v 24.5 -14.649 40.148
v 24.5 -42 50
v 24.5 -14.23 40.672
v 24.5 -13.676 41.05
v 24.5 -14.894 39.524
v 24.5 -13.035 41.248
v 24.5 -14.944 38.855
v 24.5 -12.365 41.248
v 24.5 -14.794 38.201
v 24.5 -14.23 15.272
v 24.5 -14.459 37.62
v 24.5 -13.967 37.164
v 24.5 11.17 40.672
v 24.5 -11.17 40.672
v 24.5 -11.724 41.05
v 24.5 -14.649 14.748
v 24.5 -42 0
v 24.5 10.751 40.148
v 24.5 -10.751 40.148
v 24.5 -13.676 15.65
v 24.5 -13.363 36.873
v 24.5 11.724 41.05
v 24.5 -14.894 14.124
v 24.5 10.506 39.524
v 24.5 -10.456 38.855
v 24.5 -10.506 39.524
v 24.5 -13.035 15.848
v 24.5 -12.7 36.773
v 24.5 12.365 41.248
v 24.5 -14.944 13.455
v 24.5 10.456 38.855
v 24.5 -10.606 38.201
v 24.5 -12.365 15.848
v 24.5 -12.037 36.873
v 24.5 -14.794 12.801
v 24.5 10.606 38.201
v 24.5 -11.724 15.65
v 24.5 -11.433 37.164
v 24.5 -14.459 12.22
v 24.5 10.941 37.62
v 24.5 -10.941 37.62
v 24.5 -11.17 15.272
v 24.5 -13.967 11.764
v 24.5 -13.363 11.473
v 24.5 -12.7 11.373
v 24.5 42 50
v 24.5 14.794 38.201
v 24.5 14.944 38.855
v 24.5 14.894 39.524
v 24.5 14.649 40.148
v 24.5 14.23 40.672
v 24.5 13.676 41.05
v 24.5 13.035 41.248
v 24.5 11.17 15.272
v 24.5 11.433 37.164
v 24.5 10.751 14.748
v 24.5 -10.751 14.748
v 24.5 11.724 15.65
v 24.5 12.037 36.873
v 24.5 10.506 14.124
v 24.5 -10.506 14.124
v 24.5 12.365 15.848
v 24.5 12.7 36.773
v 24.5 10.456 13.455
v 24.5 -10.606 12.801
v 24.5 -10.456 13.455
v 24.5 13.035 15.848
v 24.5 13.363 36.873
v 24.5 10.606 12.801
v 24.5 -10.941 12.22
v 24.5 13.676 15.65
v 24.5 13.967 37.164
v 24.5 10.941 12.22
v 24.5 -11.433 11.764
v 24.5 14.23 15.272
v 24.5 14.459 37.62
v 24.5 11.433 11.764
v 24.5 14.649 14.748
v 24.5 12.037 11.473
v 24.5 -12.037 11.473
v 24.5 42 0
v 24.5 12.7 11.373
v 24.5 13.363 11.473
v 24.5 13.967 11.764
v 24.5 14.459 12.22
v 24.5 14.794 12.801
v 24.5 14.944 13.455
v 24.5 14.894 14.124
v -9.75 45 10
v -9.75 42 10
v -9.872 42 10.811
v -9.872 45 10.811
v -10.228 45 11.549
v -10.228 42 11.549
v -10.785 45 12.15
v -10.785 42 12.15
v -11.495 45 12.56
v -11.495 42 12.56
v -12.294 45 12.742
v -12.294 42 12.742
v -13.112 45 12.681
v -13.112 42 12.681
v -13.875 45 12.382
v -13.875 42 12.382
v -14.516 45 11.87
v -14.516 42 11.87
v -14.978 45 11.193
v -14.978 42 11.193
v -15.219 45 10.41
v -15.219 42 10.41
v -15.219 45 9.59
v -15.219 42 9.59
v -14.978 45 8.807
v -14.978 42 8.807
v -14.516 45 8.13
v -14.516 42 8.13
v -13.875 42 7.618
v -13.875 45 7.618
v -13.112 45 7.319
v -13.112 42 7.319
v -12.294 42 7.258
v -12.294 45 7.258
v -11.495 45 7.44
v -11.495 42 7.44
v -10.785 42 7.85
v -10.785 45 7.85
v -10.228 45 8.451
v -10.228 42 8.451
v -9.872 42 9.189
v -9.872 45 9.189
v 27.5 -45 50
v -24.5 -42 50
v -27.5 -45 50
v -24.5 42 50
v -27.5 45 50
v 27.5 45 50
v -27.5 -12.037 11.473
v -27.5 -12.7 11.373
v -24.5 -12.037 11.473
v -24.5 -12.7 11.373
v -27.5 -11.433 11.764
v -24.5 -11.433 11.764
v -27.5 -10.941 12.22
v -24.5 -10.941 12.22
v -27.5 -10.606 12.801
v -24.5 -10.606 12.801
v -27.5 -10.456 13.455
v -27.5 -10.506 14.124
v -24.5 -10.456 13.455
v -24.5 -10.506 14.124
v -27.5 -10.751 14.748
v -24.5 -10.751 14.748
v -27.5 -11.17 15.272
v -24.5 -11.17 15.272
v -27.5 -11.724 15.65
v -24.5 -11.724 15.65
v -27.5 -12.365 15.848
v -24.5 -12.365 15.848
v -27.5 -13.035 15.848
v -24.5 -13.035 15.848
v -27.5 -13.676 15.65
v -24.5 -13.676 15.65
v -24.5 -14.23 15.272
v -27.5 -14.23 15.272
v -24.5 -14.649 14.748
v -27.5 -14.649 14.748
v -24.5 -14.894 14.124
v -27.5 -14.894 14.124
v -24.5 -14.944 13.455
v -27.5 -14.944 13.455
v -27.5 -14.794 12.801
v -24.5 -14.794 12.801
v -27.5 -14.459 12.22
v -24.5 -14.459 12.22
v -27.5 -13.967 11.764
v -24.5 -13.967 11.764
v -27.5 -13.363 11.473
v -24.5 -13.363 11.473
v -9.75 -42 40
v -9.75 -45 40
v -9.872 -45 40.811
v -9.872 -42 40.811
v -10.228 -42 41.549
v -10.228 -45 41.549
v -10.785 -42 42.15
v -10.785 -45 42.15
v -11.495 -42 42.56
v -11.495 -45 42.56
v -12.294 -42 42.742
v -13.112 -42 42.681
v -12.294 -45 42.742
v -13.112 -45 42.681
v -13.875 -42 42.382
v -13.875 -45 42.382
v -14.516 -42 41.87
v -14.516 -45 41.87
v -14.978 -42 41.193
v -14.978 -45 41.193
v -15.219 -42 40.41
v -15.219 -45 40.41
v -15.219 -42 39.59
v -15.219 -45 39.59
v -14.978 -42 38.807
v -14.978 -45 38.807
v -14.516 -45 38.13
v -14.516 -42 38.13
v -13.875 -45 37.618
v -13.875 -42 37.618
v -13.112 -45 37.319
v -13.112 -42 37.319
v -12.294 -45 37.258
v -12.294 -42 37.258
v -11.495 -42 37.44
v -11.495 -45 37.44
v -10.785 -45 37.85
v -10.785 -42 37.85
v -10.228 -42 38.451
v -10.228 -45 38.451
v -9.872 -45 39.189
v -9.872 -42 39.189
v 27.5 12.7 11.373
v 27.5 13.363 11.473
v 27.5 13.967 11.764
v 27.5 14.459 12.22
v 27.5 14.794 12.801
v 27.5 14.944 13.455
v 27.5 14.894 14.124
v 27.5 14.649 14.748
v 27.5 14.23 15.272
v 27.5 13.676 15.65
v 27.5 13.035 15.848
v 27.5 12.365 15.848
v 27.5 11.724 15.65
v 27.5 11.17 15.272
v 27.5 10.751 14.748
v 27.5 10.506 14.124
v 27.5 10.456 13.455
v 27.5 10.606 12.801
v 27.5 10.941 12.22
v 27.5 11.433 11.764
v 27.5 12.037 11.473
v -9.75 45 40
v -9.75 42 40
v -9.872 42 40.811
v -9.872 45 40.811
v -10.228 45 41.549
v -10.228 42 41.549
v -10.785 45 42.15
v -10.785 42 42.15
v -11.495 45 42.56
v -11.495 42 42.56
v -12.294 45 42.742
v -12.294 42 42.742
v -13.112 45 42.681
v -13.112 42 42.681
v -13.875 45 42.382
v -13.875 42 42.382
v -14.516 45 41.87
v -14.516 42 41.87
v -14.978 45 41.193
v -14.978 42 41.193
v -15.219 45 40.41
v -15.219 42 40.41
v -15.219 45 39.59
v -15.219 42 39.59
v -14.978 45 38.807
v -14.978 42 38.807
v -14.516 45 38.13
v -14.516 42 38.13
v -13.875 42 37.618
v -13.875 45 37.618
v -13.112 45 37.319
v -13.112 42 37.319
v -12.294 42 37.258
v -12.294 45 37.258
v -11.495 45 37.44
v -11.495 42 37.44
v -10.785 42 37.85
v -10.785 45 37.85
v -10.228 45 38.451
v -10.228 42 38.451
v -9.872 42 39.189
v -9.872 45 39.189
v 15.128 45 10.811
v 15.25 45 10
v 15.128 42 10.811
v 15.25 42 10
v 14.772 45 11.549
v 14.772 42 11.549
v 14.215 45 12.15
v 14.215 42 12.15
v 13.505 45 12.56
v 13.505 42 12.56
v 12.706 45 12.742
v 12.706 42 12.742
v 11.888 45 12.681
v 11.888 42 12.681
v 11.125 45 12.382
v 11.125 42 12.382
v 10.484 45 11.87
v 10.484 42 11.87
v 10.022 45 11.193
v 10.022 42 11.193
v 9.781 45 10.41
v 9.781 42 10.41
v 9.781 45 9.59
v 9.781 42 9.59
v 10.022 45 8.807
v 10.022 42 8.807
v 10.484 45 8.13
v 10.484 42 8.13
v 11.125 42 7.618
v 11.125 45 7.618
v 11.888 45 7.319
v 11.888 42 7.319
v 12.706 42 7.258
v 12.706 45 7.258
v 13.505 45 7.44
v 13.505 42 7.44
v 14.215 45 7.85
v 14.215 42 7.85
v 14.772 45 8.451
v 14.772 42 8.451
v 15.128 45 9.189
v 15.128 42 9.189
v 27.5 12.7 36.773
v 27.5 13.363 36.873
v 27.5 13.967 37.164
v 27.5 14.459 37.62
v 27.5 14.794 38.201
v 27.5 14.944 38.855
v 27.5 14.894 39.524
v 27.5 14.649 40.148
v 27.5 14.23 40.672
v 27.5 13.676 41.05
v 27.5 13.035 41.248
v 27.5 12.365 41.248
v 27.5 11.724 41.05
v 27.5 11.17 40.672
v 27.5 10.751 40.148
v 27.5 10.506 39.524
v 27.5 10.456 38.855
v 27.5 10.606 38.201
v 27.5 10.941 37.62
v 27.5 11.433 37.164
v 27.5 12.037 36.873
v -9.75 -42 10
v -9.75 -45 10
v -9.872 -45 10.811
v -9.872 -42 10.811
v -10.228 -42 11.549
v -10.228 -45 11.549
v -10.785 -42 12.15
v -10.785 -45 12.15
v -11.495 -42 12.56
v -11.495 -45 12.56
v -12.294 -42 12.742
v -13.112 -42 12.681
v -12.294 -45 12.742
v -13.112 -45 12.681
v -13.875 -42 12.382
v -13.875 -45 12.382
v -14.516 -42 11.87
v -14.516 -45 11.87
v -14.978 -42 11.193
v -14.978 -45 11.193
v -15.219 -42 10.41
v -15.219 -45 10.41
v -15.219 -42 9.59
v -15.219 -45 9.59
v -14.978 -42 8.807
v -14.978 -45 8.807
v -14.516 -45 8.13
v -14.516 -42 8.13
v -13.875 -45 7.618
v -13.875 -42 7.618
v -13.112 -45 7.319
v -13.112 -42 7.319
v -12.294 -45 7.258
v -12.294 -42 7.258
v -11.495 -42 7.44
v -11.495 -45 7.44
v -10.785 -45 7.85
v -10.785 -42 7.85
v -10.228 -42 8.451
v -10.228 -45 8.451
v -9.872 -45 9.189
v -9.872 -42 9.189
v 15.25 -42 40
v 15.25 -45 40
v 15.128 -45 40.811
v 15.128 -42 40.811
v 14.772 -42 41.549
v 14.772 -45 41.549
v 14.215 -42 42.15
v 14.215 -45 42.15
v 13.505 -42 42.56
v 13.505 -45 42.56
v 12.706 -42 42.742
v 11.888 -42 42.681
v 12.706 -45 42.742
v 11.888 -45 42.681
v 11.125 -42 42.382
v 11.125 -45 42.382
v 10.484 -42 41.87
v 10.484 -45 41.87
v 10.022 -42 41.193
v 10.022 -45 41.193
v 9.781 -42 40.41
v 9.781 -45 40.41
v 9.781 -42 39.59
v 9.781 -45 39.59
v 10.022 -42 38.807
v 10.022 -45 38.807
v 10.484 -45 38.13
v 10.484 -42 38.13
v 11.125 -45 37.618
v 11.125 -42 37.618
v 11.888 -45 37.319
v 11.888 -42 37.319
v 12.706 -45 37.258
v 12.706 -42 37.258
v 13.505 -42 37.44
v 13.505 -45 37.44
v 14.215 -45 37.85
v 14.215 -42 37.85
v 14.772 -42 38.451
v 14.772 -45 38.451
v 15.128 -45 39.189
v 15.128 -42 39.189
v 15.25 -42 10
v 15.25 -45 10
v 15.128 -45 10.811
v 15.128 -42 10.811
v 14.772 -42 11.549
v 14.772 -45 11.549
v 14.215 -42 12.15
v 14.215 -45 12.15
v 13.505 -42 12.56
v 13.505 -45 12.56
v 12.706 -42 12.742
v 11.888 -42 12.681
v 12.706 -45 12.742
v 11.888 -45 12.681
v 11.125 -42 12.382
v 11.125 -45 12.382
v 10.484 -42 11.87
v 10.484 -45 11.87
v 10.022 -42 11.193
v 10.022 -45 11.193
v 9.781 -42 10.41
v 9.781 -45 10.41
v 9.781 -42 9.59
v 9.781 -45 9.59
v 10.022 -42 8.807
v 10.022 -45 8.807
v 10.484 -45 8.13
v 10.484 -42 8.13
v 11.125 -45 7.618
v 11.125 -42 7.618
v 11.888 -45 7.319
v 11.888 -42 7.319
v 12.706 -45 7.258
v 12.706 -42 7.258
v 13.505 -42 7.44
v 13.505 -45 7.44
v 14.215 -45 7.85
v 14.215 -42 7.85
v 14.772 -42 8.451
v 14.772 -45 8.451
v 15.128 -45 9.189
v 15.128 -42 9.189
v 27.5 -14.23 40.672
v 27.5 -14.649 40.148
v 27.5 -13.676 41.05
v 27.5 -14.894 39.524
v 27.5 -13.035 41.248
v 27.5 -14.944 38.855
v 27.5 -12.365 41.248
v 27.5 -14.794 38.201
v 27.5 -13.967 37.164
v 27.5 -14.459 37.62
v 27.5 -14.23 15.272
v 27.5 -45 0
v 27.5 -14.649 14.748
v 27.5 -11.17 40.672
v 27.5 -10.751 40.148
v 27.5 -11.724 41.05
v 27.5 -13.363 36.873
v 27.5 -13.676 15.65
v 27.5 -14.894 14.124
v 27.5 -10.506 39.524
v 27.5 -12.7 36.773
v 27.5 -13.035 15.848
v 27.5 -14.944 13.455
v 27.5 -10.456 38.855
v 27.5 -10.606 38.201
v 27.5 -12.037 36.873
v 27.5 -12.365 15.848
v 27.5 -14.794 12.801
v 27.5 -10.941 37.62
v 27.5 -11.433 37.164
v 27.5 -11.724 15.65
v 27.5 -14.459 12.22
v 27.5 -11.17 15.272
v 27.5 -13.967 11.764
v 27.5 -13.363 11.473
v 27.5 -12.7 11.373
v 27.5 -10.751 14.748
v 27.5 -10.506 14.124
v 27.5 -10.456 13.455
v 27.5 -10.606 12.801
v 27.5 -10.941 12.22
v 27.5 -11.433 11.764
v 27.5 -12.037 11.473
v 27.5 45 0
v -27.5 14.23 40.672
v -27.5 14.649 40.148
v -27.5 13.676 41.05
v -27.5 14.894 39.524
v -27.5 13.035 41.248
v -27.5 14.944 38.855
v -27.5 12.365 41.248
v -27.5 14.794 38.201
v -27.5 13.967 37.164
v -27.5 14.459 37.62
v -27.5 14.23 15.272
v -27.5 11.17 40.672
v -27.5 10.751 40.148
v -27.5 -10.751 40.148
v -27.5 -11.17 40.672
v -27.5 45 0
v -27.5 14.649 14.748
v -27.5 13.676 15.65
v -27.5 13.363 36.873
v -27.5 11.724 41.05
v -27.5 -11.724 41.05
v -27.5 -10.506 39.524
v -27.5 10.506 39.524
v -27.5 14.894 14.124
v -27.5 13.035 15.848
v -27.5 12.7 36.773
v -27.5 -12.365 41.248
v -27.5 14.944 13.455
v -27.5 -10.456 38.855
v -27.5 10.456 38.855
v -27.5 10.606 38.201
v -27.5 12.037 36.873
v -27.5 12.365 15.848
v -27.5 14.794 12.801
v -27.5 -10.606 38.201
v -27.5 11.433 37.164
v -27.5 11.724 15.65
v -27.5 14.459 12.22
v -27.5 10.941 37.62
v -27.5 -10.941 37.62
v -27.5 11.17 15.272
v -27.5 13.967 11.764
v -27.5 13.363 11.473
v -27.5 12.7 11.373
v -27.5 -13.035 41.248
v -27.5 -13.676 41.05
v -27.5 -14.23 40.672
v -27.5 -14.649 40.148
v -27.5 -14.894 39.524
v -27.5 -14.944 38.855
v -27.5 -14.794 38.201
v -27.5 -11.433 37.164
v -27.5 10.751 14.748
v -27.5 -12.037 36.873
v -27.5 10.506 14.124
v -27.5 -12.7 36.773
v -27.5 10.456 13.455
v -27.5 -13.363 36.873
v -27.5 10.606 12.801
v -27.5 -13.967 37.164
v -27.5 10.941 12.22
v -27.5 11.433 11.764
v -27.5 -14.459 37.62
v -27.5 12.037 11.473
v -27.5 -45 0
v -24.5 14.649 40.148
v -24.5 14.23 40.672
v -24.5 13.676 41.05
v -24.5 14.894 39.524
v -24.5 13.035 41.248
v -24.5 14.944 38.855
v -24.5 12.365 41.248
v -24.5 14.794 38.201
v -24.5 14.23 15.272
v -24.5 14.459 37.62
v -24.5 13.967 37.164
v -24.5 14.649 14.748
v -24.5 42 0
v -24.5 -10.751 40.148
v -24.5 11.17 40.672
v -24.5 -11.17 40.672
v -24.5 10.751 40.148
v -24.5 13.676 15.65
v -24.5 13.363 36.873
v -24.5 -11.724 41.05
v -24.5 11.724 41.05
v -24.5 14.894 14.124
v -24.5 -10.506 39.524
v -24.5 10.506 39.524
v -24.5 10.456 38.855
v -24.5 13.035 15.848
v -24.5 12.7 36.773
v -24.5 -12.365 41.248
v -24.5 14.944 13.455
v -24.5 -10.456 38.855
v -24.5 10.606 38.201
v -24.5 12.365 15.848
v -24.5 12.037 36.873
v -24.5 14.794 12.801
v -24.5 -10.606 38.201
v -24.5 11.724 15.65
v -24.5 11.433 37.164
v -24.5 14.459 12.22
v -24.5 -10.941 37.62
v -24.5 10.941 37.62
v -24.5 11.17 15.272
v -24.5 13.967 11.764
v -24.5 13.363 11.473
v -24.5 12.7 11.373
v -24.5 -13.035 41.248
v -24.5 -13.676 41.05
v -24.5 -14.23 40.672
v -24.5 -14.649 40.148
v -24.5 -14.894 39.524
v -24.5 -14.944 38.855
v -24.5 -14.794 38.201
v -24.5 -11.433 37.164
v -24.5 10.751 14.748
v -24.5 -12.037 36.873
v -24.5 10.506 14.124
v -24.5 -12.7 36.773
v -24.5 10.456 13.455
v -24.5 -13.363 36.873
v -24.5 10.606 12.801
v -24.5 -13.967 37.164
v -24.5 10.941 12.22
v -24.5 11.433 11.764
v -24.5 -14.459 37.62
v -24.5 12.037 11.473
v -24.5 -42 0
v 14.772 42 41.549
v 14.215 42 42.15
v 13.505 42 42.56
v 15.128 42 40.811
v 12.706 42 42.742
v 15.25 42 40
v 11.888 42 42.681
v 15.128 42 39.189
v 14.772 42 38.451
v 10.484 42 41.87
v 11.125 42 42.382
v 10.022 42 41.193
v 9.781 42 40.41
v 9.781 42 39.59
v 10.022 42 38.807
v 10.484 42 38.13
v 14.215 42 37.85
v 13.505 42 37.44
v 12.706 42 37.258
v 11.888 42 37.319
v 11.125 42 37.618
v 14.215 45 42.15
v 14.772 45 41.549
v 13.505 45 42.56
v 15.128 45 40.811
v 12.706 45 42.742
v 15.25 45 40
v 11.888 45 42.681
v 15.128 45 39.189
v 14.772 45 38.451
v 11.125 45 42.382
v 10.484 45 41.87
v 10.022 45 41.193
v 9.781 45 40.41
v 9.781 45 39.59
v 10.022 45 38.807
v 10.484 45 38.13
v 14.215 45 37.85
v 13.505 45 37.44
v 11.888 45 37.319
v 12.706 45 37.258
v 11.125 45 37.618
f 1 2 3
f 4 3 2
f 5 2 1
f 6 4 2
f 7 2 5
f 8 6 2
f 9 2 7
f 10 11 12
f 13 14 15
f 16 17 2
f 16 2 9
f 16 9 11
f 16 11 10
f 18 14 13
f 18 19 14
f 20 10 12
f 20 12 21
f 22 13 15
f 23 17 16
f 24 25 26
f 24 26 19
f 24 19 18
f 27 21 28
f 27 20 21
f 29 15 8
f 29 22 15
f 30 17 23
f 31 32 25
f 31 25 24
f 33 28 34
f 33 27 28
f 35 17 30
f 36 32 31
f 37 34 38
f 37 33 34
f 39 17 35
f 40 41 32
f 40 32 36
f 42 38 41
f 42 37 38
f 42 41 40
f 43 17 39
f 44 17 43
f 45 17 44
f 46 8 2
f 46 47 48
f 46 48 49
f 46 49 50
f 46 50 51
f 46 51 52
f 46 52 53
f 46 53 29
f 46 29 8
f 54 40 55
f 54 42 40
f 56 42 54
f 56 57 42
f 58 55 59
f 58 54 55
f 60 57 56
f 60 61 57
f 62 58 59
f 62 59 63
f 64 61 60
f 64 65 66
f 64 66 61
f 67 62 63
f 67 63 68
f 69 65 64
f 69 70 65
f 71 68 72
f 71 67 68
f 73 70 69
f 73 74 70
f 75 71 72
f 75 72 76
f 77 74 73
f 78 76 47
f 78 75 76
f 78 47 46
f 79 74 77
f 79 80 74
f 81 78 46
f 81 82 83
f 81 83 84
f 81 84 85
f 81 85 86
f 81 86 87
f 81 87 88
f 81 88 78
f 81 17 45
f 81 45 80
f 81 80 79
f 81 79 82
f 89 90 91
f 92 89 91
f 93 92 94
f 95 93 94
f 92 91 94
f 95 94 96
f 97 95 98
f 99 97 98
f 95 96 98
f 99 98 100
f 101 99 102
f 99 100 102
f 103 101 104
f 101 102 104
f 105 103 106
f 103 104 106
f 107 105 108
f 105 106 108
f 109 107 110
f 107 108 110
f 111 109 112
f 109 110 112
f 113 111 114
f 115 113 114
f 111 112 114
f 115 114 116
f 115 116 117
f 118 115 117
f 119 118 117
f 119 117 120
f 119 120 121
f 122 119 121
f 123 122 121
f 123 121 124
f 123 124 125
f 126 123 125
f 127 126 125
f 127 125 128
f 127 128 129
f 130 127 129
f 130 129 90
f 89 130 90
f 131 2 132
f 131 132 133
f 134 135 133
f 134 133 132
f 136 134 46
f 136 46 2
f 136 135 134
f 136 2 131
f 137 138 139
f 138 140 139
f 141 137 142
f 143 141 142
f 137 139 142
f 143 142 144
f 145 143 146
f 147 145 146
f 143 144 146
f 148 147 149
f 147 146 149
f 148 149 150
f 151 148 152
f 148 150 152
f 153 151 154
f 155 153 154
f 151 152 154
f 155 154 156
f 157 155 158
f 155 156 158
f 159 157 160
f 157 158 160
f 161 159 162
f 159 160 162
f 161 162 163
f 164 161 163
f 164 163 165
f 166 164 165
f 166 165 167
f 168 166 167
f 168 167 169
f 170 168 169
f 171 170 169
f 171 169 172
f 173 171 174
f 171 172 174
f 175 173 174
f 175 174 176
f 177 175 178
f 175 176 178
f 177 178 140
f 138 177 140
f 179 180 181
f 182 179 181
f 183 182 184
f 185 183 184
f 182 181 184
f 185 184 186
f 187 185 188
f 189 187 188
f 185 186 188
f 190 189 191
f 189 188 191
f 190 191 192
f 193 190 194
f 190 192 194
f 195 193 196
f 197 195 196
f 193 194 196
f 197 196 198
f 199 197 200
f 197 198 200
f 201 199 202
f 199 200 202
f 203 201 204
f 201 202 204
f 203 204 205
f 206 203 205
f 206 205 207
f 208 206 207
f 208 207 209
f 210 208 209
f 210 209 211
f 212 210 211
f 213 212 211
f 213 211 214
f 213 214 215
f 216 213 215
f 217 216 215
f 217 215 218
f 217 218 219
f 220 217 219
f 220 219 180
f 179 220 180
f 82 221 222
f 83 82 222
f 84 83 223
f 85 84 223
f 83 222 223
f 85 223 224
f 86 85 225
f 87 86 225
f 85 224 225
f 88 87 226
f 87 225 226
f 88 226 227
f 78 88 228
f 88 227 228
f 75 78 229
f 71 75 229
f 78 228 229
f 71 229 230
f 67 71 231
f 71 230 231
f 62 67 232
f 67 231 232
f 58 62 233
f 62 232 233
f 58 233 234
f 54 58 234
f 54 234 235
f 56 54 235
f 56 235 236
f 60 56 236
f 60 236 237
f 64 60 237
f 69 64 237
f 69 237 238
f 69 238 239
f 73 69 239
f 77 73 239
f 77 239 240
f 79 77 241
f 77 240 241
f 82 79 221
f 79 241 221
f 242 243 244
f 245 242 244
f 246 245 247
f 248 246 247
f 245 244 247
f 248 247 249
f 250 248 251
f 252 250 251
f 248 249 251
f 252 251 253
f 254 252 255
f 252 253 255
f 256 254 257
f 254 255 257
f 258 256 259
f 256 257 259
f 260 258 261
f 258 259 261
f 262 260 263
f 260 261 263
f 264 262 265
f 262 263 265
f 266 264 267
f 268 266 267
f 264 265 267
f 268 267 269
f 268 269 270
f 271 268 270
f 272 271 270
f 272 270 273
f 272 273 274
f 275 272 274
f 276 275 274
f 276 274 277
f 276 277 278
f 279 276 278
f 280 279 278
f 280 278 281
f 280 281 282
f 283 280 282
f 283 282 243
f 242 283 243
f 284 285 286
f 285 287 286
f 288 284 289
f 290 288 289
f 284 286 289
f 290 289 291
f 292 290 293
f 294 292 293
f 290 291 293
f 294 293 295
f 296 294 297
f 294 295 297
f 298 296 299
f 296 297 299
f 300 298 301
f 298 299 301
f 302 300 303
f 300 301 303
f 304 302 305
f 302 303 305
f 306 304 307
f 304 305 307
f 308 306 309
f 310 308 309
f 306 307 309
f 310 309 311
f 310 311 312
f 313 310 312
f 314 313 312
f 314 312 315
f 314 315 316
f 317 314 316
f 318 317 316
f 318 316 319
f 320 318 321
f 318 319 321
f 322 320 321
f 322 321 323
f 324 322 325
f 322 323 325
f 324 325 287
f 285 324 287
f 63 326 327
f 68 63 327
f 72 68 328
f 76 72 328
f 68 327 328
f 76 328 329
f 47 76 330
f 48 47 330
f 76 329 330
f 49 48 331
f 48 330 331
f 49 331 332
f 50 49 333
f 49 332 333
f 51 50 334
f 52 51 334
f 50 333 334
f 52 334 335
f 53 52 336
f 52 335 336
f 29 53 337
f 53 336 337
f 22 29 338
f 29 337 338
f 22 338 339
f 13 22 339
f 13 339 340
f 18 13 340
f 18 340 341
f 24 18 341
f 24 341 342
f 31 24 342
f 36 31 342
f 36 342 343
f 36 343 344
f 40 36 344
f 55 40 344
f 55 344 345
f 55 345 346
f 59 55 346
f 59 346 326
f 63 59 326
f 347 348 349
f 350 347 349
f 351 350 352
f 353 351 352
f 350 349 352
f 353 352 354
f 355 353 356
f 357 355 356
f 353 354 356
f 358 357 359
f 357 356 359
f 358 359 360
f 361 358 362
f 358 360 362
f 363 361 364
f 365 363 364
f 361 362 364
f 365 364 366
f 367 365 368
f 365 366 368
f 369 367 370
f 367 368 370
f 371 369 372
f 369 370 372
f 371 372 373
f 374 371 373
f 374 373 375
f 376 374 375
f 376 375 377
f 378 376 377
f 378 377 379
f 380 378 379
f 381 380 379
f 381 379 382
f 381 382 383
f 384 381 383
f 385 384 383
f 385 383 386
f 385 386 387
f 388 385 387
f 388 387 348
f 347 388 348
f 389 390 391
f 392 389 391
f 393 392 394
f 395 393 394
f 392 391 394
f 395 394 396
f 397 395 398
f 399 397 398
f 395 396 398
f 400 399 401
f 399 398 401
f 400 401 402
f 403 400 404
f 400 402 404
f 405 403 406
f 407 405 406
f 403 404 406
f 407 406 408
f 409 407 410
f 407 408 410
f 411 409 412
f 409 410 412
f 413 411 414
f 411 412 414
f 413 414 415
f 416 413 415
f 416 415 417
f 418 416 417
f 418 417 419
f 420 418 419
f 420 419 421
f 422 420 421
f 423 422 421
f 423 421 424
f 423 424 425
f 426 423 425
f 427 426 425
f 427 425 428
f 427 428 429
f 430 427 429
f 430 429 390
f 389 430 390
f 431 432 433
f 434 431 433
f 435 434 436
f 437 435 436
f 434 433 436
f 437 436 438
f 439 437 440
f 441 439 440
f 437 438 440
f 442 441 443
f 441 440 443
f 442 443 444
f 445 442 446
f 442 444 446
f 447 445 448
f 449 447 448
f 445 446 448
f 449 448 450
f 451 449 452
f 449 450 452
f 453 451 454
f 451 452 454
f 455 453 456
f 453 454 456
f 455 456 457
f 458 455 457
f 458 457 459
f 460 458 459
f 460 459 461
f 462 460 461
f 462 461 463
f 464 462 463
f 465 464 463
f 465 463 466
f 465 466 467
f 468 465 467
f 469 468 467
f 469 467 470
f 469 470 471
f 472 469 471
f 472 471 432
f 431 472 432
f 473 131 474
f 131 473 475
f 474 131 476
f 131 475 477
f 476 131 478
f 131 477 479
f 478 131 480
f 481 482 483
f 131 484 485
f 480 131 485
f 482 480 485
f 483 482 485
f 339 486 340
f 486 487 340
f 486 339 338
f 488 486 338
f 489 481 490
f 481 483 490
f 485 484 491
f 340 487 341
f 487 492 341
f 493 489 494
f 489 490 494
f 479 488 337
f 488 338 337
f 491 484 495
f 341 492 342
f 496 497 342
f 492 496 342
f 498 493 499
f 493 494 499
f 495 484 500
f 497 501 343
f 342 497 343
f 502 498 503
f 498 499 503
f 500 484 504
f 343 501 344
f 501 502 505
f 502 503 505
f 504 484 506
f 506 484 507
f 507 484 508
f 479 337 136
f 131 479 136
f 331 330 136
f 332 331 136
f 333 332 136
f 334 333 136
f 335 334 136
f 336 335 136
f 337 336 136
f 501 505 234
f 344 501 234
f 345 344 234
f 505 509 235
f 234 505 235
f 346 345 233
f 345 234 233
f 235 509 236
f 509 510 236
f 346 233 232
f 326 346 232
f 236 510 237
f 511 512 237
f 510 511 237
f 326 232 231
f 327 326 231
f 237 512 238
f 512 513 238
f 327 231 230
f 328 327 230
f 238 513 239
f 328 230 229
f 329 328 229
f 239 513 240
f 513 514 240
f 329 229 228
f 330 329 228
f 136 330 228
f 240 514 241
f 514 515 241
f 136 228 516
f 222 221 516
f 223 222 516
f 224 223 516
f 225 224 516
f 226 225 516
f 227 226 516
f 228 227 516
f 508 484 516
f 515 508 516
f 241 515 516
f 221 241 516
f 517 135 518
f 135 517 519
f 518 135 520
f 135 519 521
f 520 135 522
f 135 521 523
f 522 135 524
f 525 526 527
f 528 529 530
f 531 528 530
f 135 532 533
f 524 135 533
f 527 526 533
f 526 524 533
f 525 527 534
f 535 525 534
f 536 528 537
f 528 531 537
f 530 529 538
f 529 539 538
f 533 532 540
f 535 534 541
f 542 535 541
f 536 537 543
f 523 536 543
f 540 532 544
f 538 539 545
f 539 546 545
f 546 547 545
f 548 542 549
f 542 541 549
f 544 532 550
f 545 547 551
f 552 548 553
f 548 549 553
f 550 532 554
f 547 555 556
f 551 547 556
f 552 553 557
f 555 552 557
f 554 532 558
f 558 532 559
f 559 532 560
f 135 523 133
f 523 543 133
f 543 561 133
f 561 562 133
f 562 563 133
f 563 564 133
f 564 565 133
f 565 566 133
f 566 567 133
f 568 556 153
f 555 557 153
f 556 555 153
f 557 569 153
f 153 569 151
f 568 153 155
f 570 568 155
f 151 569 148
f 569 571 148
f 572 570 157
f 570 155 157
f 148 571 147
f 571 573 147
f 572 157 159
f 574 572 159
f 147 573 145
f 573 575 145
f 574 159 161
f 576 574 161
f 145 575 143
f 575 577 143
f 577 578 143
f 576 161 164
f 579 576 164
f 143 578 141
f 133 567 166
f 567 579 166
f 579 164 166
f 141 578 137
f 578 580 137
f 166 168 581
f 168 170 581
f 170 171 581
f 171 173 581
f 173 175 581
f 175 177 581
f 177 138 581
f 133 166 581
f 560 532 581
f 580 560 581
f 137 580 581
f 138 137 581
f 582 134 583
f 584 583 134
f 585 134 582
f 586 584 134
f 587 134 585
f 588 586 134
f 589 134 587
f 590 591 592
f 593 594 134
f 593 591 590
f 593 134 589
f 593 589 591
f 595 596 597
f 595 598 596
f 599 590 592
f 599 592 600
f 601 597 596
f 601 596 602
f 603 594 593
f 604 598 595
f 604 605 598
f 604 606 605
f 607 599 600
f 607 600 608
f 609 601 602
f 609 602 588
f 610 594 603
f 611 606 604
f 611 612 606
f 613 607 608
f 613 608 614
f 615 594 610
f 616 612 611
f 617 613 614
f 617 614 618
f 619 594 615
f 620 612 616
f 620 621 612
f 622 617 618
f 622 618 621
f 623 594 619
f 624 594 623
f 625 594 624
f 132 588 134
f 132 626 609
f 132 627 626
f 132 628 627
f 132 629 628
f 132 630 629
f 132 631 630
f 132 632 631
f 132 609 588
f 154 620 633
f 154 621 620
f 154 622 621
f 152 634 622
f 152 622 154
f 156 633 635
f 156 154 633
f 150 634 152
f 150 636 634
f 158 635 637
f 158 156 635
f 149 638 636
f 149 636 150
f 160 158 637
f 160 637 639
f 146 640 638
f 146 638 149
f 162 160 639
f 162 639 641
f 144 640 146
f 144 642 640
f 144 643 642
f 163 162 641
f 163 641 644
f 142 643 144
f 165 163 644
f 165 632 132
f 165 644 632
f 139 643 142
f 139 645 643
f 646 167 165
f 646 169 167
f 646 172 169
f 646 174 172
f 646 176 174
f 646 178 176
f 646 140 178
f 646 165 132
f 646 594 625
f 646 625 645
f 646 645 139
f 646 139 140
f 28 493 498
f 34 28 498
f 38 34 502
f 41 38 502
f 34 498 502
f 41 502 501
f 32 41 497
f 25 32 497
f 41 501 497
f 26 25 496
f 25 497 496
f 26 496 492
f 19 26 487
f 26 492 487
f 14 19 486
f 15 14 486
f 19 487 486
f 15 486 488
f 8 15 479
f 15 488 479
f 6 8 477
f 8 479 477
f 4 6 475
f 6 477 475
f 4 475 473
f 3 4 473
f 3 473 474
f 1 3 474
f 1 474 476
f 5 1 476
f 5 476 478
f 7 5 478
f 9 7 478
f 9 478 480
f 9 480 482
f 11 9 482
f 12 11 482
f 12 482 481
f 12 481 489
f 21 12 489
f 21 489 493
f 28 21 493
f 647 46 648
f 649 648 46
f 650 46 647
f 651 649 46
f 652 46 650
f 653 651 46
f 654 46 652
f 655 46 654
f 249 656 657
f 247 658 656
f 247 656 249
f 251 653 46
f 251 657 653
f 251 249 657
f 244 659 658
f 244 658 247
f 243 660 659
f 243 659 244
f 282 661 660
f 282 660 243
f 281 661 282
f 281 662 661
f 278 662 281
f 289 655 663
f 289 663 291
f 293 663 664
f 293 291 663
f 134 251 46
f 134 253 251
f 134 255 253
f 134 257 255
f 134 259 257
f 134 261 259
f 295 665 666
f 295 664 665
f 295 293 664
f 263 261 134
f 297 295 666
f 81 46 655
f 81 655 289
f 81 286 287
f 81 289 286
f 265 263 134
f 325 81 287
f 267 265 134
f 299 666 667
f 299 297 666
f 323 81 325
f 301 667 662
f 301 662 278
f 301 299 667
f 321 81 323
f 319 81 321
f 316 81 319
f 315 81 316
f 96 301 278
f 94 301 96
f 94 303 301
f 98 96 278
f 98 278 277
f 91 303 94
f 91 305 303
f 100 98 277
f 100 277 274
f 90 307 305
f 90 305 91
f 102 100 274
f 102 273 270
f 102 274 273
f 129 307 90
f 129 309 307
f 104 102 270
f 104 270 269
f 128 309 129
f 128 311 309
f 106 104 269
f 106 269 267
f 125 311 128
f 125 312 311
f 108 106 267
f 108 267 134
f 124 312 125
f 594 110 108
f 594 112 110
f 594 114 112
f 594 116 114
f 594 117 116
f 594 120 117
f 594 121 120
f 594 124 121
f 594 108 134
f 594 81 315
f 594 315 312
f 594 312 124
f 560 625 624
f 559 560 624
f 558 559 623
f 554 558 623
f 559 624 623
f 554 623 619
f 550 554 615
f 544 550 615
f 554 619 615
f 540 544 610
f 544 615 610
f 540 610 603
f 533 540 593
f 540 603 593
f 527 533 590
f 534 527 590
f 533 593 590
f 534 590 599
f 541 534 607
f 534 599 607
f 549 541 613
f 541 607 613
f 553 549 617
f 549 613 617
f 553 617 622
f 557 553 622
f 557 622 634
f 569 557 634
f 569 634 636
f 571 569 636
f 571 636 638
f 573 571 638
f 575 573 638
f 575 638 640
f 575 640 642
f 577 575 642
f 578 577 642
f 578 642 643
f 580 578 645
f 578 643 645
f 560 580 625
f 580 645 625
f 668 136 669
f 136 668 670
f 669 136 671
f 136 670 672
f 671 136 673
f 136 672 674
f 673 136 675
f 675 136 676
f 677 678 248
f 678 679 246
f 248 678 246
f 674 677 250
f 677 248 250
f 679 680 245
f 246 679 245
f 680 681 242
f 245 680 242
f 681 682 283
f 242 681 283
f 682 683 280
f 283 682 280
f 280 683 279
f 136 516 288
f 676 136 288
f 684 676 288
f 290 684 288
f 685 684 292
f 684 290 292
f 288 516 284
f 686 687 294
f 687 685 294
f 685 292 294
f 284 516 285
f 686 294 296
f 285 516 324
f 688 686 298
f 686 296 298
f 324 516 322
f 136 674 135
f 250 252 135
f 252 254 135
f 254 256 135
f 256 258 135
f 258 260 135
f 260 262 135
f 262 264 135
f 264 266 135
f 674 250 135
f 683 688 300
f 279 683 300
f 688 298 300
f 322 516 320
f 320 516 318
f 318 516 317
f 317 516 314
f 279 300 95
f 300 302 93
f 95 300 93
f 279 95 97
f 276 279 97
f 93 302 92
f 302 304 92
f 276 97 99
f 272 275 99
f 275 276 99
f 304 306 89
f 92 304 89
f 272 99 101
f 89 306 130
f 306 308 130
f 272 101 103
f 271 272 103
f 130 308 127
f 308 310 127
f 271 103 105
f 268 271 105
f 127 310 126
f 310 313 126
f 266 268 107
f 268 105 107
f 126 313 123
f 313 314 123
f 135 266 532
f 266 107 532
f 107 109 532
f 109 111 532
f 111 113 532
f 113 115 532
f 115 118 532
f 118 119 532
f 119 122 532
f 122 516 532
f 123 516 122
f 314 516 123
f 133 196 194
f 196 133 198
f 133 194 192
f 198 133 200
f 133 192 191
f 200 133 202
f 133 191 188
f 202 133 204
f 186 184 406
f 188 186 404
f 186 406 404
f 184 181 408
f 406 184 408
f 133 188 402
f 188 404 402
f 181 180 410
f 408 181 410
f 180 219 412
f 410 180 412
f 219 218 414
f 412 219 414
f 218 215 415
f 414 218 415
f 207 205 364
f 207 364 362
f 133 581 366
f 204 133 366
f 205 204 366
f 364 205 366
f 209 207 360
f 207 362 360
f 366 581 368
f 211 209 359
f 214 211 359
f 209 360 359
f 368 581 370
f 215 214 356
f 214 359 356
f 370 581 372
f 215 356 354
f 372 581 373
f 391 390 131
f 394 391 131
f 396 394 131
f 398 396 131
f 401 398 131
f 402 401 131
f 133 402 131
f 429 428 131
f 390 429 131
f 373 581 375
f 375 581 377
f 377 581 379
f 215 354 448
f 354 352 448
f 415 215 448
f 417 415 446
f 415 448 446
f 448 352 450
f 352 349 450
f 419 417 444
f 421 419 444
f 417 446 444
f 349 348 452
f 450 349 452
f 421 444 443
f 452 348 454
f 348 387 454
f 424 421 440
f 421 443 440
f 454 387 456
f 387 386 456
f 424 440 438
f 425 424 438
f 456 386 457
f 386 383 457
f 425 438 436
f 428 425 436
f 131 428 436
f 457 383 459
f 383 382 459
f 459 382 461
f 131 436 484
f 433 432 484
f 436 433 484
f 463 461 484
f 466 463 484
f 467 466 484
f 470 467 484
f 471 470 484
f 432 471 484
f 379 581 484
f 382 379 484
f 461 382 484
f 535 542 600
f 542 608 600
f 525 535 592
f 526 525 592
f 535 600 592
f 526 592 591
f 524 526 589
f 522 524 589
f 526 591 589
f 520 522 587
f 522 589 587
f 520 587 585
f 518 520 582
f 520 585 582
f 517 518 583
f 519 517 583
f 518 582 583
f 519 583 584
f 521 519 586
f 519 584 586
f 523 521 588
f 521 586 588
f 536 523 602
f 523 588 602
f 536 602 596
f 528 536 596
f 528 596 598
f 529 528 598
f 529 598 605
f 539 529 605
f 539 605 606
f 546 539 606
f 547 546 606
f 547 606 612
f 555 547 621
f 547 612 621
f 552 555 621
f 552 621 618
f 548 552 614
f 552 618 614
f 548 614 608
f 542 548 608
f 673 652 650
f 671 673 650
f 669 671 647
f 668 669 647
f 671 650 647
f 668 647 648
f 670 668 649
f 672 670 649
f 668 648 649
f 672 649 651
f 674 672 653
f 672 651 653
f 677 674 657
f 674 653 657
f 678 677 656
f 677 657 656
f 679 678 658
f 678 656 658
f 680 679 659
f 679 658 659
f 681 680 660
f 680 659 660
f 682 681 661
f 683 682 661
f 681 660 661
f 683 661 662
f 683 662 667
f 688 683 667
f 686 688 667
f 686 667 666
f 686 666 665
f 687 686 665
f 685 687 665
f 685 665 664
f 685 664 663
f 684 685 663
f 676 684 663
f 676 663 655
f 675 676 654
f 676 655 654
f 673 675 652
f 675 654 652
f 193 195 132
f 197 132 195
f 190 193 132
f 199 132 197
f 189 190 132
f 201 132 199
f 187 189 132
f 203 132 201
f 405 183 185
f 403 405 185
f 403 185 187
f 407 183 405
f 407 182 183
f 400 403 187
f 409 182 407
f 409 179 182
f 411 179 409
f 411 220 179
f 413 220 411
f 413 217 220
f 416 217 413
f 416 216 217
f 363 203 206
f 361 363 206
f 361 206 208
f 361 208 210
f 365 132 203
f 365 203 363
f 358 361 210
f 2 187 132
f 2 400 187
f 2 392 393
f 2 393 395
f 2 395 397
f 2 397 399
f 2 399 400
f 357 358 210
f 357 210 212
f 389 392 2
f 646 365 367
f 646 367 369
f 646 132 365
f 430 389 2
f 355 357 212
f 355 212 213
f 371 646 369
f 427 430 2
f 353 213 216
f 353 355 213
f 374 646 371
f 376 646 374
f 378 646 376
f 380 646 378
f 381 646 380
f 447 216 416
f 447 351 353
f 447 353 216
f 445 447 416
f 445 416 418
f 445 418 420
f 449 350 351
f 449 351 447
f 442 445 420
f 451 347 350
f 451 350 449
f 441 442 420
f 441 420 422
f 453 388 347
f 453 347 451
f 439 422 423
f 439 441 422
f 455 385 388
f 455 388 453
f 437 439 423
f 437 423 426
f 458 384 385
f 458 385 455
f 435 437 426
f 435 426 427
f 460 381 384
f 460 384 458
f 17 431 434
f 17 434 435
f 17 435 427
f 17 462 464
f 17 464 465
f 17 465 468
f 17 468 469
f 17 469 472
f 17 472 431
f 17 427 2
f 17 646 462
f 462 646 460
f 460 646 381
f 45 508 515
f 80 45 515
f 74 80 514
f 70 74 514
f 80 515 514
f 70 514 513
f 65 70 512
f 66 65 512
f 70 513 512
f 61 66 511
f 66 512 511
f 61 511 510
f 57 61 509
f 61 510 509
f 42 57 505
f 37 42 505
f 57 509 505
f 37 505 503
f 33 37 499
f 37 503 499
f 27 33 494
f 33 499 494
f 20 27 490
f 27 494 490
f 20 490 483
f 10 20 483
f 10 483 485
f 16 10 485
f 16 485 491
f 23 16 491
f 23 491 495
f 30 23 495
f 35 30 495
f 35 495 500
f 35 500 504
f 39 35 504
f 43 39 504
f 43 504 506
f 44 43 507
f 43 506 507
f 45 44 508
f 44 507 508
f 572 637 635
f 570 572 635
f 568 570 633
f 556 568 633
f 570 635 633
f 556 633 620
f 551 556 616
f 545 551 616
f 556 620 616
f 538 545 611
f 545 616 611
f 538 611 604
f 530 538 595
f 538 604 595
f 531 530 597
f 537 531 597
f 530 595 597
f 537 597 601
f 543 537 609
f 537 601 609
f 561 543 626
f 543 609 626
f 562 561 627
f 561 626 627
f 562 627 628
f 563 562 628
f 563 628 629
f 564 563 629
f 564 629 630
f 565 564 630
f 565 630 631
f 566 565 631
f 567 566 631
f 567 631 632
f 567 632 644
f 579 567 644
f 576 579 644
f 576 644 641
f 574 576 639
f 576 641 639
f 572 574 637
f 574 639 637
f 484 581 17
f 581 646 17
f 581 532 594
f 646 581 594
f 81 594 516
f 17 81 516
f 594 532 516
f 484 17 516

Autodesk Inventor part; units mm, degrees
ref_plane "YZ Plane" through (0, 0, 0) normal (1, 0, 0) x (0, 1, 0)
ref_plane "XZ Plane" through (0, 0, 0) normal (0, 1, 0) x (-1, 0, 0)
ref_plane "XY Plane" through (0, 0, 0) normal (0, 0, 1) x (1, 0, 0)
sketch "Sketch1" plane through (0, 0, 0) normal (0, 0, 1) x (1, 0, 0)
  line L0 (-27.5, -45) -> (27.5, -45)
  line L1 (27.5, -45) -> (27.5, 45)
  line L2 (27.5, 45) -> (-27.5, 45)
  line L3 (-27.5, 45) -> (-27.5, -45)
  line L4 (-27.5, -45) -> (27.5, 45) construction
  line L5 (27.5, -45) -> (-27.5, 45) construction
  line L6 (-24.5, -42) -> (24.5, -42)
  line L7 (24.5, -42) -> (24.5, 42)
  line L8 (24.5, 42) -> (-24.5, 42)
  line L9 (-24.5, 42) -> (-24.5, -42)
  line L10 (-24.5, -42) -> (24.5, 42) construction
  line L11 (24.5, -42) -> (-24.5, 42) construction
  point P0 (0, 0)
  dimension "d0" = 55
  dimension "d1" = 90
  dimension "d2" = 49
  dimension "d3" = 84
extrude "Extrusion1" add sketch "Sketch1" along normal blind 50
sketch "Sketch2" plane through (-27.5, -45, 0) normal (0, -1, 0) x (1, 0, 0)
  circle A0 centre (15, 40) radius 2.75
  circle A1 centre (40, 40) radius 2.75
  circle A2 centre (15, 10) radius 2.75
  circle A3 centre (40, 10) radius 2.75
  line L0 (55, 0) -> (55, 50) projected
  line L1 (0, 50) -> (55, 50) projected
  line L2 (0, 0) -> (55, 0) projected
  line L3 (0, 0) -> (0, 50) projected
  point P0 (27.5, 0)
  dimension "d6" = 5.5
  dimension "d7" = 5.5
  dimension "d8" = 5.5
  dimension "d9" = 5.5
  dimension "d10" = 15
  dimension "d11" = 10
  dimension "d12" = 15
  dimension "d13" = 10
  dimension "d14" = 10
  dimension "d15" = 15
  dimension "d16" = 15
  dimension "d17" = 10
extrude "Extrusion2" cut sketch "Sketch2" against normal blind 97.625 contours A0 | A1 | A2 | A3
sketch "Sketch3" plane through (27.5, -45, 0) normal (1, 0, 0) x (0, 0, -1)
  circle A0 centre (-39.023, 57.7) radius 2.25
  circle A1 centre (-13.623, 57.7) radius 2.25
  circle A2 centre (-39.023, 32.3) radius 2.25
  circle A3 centre (-13.623, 32.3) radius 2.25
  line L0 (0, 90) -> (-50, 90) projected
  line L1 (0, 0) -> (0, 90) projected
  point P0 (0, 45)
  dimension "d20" = 4.5
  dimension "d21" = 4.5
  dimension "d22" = 4.5
  dimension "d23" = 4.5
  dimension "d24" = 25.4
  dimension "d25" = 25.4
  dimension "d26" = 25.4
  dimension "d27" = 25.4
  dimension "d29" = 25.4
  dimension "d30" = 25.4
  dimension "d31" = 32.3
  dimension "d32" = 13.623
extrude "Extrusion3" cut sketch "Sketch3" against normal blind 60
properties part number "Front Motor Connector"
